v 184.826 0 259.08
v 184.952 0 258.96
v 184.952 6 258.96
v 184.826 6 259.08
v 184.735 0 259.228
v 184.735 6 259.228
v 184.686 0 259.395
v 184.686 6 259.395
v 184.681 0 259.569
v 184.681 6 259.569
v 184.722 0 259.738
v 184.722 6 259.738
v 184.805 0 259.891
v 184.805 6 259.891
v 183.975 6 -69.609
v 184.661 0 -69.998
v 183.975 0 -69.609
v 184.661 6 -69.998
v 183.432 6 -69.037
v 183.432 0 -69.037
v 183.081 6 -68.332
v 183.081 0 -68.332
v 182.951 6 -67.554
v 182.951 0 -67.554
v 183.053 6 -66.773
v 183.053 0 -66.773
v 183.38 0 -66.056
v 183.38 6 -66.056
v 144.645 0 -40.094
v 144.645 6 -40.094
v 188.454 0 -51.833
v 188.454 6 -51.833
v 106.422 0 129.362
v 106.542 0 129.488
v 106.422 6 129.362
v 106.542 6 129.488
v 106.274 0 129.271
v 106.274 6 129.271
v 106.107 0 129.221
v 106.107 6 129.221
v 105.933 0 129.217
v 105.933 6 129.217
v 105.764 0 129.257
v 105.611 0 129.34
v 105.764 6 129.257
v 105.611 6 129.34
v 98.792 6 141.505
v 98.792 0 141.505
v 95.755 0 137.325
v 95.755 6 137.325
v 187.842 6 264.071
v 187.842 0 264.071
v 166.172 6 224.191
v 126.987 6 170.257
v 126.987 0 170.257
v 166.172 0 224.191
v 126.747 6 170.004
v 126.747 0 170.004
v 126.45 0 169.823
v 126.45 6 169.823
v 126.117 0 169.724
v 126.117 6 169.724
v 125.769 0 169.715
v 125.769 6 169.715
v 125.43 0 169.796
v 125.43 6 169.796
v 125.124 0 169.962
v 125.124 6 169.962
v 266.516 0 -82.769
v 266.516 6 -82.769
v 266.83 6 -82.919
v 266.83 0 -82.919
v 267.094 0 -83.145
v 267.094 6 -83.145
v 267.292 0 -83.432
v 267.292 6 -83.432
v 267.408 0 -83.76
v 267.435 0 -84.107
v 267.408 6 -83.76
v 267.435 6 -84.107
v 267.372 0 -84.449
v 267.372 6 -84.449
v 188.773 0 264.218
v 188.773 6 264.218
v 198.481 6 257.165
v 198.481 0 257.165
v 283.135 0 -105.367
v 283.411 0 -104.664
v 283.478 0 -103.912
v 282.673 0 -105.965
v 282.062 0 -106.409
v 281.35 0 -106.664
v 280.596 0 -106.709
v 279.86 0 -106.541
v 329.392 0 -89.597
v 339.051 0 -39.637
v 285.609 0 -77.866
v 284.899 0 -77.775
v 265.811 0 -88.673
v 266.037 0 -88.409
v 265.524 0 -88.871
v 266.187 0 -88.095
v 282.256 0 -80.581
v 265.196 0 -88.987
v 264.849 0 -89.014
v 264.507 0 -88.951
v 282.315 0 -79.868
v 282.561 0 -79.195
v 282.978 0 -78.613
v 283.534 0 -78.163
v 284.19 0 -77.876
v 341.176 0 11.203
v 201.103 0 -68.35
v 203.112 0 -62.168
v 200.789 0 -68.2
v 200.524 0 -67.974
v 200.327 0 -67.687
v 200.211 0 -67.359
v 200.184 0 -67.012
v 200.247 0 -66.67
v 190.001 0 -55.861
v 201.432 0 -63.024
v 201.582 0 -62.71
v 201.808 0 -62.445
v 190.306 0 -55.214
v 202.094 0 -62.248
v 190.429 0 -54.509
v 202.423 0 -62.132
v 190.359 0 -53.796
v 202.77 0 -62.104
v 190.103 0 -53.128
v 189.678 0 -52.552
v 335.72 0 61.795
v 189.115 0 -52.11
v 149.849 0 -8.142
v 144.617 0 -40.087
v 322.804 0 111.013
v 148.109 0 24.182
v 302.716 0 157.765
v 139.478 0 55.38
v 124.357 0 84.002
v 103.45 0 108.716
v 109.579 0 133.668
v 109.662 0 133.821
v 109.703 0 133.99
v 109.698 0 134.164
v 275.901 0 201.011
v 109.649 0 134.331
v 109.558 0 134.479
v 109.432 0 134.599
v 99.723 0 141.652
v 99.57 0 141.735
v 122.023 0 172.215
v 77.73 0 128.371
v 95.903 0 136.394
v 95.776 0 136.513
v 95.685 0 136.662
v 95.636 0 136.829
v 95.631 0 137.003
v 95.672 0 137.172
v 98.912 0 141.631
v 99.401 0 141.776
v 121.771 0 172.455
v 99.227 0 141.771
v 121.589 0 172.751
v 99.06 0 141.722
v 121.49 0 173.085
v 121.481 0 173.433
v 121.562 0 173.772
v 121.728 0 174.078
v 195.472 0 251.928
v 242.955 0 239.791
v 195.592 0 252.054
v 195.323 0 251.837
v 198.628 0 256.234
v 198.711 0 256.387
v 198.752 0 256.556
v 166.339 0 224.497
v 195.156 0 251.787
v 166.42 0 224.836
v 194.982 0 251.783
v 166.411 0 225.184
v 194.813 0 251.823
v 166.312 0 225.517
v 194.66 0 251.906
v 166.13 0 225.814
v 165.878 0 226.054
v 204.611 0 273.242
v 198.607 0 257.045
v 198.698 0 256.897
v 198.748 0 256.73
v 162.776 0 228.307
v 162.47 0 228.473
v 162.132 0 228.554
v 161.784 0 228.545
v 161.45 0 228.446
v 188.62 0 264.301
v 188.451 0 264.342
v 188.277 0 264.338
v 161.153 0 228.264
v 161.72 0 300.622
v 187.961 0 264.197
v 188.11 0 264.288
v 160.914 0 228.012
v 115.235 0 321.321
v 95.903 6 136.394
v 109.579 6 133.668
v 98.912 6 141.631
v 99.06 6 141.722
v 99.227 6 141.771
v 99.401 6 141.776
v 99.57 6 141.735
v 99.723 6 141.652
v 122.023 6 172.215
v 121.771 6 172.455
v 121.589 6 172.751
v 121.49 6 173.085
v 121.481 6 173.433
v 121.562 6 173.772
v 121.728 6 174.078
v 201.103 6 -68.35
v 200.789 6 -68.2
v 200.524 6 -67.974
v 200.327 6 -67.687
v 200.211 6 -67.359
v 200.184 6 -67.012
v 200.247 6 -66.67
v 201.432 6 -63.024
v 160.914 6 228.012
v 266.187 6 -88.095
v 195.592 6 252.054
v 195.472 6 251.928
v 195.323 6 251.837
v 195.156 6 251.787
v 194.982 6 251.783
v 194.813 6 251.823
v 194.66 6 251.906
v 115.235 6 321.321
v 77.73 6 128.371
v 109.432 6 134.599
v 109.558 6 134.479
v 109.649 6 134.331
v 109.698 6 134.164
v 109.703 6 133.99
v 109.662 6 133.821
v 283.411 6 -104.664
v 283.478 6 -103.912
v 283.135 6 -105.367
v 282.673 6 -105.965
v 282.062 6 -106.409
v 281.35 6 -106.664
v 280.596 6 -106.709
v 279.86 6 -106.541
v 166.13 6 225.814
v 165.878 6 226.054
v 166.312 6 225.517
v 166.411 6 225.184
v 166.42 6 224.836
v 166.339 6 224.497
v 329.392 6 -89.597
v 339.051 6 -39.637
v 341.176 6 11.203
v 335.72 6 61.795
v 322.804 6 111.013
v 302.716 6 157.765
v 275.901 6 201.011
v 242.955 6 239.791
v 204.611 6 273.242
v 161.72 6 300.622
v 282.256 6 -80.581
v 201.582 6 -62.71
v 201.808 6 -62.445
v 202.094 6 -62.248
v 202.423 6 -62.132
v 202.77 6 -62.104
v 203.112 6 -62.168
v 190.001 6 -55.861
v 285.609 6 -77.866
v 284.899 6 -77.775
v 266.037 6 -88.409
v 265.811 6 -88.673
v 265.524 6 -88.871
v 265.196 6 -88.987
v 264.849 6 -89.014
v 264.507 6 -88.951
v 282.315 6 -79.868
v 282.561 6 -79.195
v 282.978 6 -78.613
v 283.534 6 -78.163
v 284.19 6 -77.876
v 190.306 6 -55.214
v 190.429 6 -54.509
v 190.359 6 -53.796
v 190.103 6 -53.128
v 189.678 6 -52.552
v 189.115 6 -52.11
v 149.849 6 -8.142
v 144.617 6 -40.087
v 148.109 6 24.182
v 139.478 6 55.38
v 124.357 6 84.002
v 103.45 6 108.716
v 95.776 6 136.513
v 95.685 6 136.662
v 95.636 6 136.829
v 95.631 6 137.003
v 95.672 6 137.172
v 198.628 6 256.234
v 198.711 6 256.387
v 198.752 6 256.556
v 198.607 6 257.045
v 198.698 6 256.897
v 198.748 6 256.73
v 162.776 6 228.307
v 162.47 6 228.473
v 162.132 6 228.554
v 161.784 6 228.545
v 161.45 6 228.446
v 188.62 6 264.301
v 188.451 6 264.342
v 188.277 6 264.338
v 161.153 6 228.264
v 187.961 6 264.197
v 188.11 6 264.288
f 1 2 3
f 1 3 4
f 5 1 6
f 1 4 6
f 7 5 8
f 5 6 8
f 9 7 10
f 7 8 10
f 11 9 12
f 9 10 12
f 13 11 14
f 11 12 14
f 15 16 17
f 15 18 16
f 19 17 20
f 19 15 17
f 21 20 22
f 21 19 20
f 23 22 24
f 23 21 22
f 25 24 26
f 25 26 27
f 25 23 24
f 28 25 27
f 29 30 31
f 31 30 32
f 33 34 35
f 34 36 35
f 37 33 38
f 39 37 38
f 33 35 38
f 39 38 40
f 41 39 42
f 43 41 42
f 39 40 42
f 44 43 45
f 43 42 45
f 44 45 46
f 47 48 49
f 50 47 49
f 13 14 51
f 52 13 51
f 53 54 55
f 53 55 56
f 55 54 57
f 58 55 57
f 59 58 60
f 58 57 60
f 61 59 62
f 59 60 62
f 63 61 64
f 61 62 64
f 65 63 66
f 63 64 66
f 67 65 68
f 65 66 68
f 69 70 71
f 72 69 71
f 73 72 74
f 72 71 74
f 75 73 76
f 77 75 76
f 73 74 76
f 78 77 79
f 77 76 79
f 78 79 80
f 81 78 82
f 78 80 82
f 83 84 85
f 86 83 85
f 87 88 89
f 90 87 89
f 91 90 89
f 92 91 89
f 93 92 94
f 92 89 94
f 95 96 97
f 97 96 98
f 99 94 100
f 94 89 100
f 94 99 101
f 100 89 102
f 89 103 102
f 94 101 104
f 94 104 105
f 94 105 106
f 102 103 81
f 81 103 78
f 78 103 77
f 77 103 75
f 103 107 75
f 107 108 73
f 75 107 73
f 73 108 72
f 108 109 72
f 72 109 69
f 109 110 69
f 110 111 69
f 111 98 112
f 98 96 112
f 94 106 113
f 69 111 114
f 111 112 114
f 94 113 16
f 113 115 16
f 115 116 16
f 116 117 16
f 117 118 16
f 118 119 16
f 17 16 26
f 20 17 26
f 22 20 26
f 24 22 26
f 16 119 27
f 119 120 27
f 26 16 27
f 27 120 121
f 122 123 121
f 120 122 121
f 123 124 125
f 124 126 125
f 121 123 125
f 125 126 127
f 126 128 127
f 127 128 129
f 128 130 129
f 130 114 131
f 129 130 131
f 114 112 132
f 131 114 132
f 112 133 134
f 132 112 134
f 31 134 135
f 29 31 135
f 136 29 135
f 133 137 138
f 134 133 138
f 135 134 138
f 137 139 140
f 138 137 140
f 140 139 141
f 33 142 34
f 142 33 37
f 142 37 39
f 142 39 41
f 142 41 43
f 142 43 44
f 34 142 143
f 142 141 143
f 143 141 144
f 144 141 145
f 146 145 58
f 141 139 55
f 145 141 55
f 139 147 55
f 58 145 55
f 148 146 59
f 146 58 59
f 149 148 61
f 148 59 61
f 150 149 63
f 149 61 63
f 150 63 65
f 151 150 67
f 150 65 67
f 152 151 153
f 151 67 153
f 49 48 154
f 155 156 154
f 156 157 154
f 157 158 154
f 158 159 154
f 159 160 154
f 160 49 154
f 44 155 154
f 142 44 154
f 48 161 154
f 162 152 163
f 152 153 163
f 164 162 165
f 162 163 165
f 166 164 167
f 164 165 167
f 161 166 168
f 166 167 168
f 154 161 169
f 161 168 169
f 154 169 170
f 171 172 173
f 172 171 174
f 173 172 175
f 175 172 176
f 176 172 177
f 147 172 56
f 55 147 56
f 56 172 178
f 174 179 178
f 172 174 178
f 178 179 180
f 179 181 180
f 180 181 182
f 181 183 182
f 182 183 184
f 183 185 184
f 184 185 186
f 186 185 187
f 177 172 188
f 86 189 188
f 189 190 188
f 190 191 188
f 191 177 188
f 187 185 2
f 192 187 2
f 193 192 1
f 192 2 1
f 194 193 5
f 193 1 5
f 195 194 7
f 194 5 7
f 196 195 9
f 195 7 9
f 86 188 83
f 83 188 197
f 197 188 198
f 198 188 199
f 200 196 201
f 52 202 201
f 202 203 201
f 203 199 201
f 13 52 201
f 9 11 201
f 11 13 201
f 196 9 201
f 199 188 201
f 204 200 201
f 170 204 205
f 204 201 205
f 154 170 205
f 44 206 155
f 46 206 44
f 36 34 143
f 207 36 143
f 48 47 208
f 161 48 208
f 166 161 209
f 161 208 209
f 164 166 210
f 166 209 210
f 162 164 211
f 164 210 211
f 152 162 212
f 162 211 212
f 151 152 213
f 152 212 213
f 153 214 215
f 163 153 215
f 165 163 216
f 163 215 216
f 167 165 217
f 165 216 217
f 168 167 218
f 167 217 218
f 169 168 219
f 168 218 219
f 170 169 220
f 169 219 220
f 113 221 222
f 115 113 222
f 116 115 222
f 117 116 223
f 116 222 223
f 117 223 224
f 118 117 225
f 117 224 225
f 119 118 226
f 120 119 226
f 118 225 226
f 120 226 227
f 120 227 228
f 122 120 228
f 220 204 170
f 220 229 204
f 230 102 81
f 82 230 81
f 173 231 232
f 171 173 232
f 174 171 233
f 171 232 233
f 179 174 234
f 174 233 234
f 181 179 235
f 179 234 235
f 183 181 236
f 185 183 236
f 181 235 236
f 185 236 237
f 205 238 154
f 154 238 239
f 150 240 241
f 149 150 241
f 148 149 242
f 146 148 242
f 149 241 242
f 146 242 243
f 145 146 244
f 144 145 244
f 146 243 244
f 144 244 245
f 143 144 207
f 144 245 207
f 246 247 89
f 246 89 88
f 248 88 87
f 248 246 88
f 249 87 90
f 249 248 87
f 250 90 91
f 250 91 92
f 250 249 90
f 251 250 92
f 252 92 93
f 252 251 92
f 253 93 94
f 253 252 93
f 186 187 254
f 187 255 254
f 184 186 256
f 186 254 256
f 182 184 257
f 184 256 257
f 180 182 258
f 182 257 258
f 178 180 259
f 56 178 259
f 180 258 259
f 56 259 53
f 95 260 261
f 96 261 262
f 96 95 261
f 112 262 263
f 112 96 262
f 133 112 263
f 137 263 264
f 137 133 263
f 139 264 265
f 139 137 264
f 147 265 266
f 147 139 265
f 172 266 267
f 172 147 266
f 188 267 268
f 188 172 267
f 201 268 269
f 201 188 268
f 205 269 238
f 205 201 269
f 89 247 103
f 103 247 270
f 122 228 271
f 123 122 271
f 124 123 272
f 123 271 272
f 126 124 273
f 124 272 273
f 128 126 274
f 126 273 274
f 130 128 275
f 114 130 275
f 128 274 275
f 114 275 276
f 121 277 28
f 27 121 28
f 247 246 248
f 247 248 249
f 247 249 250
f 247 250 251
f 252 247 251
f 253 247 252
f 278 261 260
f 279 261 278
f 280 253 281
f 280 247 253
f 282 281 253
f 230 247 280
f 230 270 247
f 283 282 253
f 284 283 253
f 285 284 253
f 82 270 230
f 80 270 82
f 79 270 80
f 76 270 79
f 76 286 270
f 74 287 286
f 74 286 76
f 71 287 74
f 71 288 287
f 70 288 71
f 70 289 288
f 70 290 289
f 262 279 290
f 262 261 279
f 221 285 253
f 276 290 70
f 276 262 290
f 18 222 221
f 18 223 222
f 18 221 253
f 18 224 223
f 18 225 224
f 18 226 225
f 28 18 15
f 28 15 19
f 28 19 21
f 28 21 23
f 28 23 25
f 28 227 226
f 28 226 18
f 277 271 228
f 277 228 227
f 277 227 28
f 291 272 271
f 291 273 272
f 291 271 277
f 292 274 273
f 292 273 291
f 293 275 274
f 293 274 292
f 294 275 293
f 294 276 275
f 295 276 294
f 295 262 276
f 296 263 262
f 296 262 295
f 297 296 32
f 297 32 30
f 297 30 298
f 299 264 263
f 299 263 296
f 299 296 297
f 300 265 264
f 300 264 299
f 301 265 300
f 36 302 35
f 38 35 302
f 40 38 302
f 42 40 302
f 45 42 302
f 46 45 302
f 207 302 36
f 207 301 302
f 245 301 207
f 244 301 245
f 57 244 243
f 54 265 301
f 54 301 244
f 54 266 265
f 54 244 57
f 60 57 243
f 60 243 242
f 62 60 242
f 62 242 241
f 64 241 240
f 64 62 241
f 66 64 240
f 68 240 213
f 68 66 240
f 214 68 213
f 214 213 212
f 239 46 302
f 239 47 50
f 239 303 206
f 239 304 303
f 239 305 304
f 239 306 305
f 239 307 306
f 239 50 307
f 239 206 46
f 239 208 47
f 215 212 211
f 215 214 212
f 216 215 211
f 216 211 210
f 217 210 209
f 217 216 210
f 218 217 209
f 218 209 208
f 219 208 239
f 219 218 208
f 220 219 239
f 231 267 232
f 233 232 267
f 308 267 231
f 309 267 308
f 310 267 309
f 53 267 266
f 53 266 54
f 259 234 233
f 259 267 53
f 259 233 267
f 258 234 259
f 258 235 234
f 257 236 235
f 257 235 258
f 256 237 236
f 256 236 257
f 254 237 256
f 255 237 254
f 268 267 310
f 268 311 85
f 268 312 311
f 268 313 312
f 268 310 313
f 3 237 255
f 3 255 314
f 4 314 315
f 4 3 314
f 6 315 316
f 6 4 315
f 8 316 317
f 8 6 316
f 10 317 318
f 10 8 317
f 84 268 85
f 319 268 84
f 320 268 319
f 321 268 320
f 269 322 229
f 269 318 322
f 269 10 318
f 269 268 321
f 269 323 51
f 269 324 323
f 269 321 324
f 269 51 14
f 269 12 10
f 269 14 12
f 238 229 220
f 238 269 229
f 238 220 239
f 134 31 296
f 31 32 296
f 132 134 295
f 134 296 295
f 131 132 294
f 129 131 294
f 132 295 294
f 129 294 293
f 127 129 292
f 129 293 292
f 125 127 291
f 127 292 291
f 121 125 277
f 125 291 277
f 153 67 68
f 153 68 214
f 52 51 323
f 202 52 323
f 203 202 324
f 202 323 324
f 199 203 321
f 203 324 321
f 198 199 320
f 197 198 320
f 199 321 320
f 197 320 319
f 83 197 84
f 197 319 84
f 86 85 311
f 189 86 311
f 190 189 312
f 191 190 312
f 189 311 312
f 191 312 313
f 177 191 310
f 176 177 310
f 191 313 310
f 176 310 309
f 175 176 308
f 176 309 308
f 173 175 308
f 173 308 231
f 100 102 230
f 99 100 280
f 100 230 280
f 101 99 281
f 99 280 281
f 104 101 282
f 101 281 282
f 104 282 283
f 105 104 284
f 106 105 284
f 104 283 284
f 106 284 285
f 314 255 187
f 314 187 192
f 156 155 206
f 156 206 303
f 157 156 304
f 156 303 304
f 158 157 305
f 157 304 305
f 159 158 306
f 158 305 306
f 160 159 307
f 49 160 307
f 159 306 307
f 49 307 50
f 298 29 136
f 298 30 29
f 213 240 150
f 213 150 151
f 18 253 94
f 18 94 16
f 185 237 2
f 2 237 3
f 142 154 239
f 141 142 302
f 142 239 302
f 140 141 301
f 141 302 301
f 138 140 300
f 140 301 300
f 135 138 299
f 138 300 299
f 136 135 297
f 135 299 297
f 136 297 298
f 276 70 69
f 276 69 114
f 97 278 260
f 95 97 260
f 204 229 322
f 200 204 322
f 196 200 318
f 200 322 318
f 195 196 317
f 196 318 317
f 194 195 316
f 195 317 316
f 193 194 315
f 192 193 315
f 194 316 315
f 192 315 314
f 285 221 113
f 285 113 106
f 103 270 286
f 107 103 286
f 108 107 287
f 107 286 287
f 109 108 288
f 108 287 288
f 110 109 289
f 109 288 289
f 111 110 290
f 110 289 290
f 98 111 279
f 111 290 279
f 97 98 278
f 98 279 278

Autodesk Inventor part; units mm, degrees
ref_plane "YZ Plane" through (0, 0, 0) normal (1, 0, 0) x (0, 1, 0)
ref_plane "XZ Plane" through (0, 0, 0) normal (0, 1, 0) x (-1, 0, 0)
ref_plane "XY Plane" through (0, 0, 0) normal (0, 0, 1) x (1, 0, 0)
sketch "Sketch1" plane through (0, 0, 0) normal (0, 1, 0) x (-1, 0, 0)
  circle A0 centre (0, 0) radius 341.36
  circle A1 centre (0, 0) radius 150.07
  dimension "d84" = 300.14
  dimension "d85" = 682.72
extrude "Extrusion3" add sketch "Sketch1" along normal blind 6 contours A0 | A1
sketch "Sketch2" plane through (0, 6, 0) normal (0, 1, 0) x (1, 0, 0)
  circle A0 centre (0, 0) radius 245.715 construction
  line L0 (245.7148, 0.3131) -> (341.6521, -0.0088)
  line L1 (3.25, 279.0483) -> (3.25, 212.3817)
  line L2 (-3.25, 212.3817) -> (-3.25, 279.0483)
  arc A1 (-3.25, 212.3817) -> (-1.9167, 211.0483) centre (-1.9167, 212.3817) ccw
  arc A2 (1.9167, 211.0483) -> (3.25, 212.3817) centre (1.9167, 212.3817) ccw
  arc A3 (-1.9167, 280.3817) -> (-3.25, 279.0483) centre (-1.9167, 279.0483) ccw
  arc A4 (3.25, 279.0483) -> (1.9167, 280.3817) centre (1.9167, 279.0483) ccw
  line L3 (-1.9167, 280.3817) -> (1.9167, 280.3817)
  line L4 (-1.9167, 211.0483) -> (1.9167, 211.0483)
  line L5 (0, 0) -> (0, 212.3817)
  line L6 (0, 280.3817) -> (0, 341.36)
  line L7 (0, 211.0483) -> (0, 245.715) construction
  line L8 (0, 280.3817) -> (0, 245.715) construction
  line L9 (-266.6835, 86.5666) -> (-233.7136, 75.854) construction
  line L10 (-264.4112, 89.2455) -> (-201.0074, 68.6444)
  arc A5 (-200.1513, 66.9643) -> (-201.0074, 68.6444) centre (-201.4194, 67.3763) ccw
  line L11 (-200.7436, 65.1414) -> (-233.7136, 75.854) construction
  line L12 (-201.3359, 63.3186) -> (-200.1513, 66.9643)
  line L13 (-267.2758, 84.7438) -> (-266.0912, 88.3895)
  line L14 (-203.016, 62.4625) -> (-266.4198, 83.0637)
  arc A6 (-203.016, 62.4625) -> (-201.3359, 63.3186) centre (-202.604, 63.7306) ccw
  arc A7 (-267.2758, 84.7438) -> (-266.4198, 83.0637) centre (-266.0077, 84.3317) ccw
  arc A8 (-264.4112, 89.2455) -> (-266.0912, 88.3895) centre (-264.8232, 87.9775) ccw
  line L15 (-165.0631, -226.6454) -> (-144.6865, -198.5995) construction
  line L16 (-166.9087, -223.6565) -> (-127.723, -169.722)
  arc A9 (-125.8606, -169.427) -> (-127.723, -169.722) centre (-126.6443, -170.5057) ccw
  line L17 (-124.31, -170.5536) -> (-144.6865, -198.5995) construction
  line L18 (-122.7594, -171.6802) -> (-125.8606, -169.427)
  line L19 (-163.5125, -227.772) -> (-166.6137, -225.5189)
  line L20 (-122.4644, -173.5426) -> (-161.6501, -227.4771)
  arc A10 (-122.4644, -173.5426) -> (-122.7594, -171.6802) centre (-123.5431, -172.7589) ccw
  arc A11 (-163.5125, -227.772) -> (-161.6501, -227.4771) centre (-162.7288, -226.6933) ccw
  arc A12 (-166.9087, -223.6565) -> (-166.6137, -225.5189) centre (-165.83, -224.4402) ccw
  line L21 (164.8042, -226.8335) -> (144.4277, -198.7876) construction
  line L22 (160.9139, -228.0119) -> (121.7282, -174.0775)
  arc A13 (122.0232, -172.2151) -> (121.7282, -174.0775) centre (122.8069, -173.2938) ccw
  line L23 (123.5738, -171.0885) -> (144.4277, -198.7876) construction
  line L24 (125.1244, -169.9619) -> (122.0232, -172.2151)
  line L25 (165.8775, -226.0537) -> (162.7763, -228.3069)
  line L26 (126.9868, -170.2569) -> (166.1725, -224.1913)
  arc A14 (126.9868, -170.2569) -> (125.1244, -169.9619) centre (125.9081, -171.0406) ccw
  arc A15 (165.8775, -226.0537) -> (166.1725, -224.1913) centre (165.0938, -224.975) ccw
  arc A16 (160.9139, -228.0119) -> (162.7763, -228.3069) centre (161.9926, -227.2282) ccw
  line L27 (266.7793, 86.2718) -> (233.8094, 75.5592) construction
  line L28 (266.5156, 82.7688) -> (203.1118, 62.1677)
  arc A17 (201.4317, 63.0238) -> (203.1118, 62.1677) centre (202.6998, 63.4358) ccw
  line L29 (200.8394, 64.8466) -> (233.8094, 75.5592) construction
  line L30 (200.2471, 66.6695) -> (201.4317, 63.0238)
  line L31 (266.187, 88.0946) -> (267.3716, 84.4489)
  line L32 (201.1032, 68.3496) -> (264.5069, 88.9507)
  arc A18 (201.1032, 68.3496) -> (200.2471, 66.6695) centre (201.5152, 67.0815) ccw
  arc A19 (266.187, 88.0946) -> (264.5069, 88.9507) centre (264.919, 87.6826) ccw
  arc A20 (266.5156, 82.7688) -> (267.3716, 84.4489) centre (266.1035, 84.0369) ccw
  point P0 (-202.0117, 65.5535)
  point P1 (-125.0937, -171.6323)
  point P2 (124.8348, -171.8204)
  point P3 (202.1075, 65.2586)
  dimension "d21" = 6.5
  dimension "d24" = 2.6667
  dimension "d25" = 2.6667
  dimension "d32" = 1.3333
  dimension "d33" = 1.3333
  dimension "d41" = 90
  dimension "d42" = 3.25
  dimension "d43" = 90
  dimension "d86" = 491.43
extrude "Extrusion4" cut sketch "Sketch2" against normal through all
sketch "Sketch3" plane through (0, 6, 0) normal (0, 1, 0) x (1, 0, 0)
  arc A0 (-115.2299, -321.3234) -> (115.2355, -321.3214) centre (0, 0) ccw
  arc A1 (-77.7244, -128.3741) -> (77.7297, -128.3709) centre (0, 0) ccw
  line L0 (-122.1811, -173.696) -> (-161.3589, -227.6196)
  line L1 (-115.2299, -321.3234) -> (-77.7244, -128.3741)
  line L2 (0, 0) -> (0, -341.2918)
  line L3 (115.2355, -321.3214) -> (77.7297, -128.3709)
  line L4 (161.3912, -227.6651) -> (122.2055, -173.7307) projected
  dimension "d52" = 25
  dimension "d87" = 150.07
  dimension "d88" = 341.36
  dimension "d89" = 25
  dimension "d90" = 11
  dimension "d91" = 11
extrude "Extrusion5" cut sketch "Sketch3" against normal blind 10
sketch "Sketch5" plane through (0, 6, 0) normal (0, 1, 0) x (1, 0, 0)
  line L0 (3.25, 279.0483) -> (3.25, 212.3817) projected
  line L1 (5.5862, 197.9634) -> (-6.155, 194.8174)
  line L2 (-11.2263, 301.7146) -> (10.5847, 293.3421)
  line L3 (6.5657, 149.9554) -> (8.9394, 195.248)
  line L4 (14.2034, 295.6921) -> (16.5771, 340.9846)
  arc A0 (10.5847, 293.3421) -> (14.2034, 295.6921) centre (11.5404, 295.8316) ccw
  arc A1 (8.9394, 195.248) -> (5.5862, 197.9634) centre (6.2763, 195.3876) ccw
  arc A2 (-11.2263, 301.7146) -> (-14.8449, 299.0854) centre (-12.1819, 299.225) ccw
  line L5 (-3.25, 212.3817) -> (-3.25, 279.0483) projected
  line L6 (-14.8449, 299.0854) -> (-9.5081, 197.2536)
  arc A3 (-9.5081, 197.2536) -> (-6.155, 194.8174) centre (-6.8451, 197.3932) ccw
  line L7 (-1.9167, 211.0483) -> (1.9167, 211.0483) projected
  line L8 (1.9167, 280.3817) -> (-1.9167, 280.3817) projected
  arc A4 (115.2355, -321.3214) -> (-115.2299, -321.3234) centre (0, 0) ccw
  line L9 (16.5771, 340.9846) -> (16.5774, 340.9903)
  arc A5 (-190.5375, 51.9119) -> (-187.1843, 54.3482) centre (-189.8473, 54.4877) ccw
  line L10 (-186.5481, 66.4868) -> (-187.1843, 54.3482)
  arc A6 (-182.9295, 68.8368) -> (-186.5481, 66.4868) centre (-183.8851, 66.3472) ccw
  arc A7 (-275.714, 100.7144) -> (-276.8308, 104.8821) centre (-277.7864, 102.3926) ccw
  line L11 (-289.0345, 78.3041) -> (-190.5375, 51.9119)
  arc A8 (-290.4167, 82.5581) -> (-289.0345, 78.3041) centre (-288.3443, 80.8799) ccw
  line L12 (-290.4167, 82.5581) -> (-275.714, 100.7144)
  line L13 (-276.8308, 104.8821) -> (-319.1731, 121.1358)
  line L14 (-140.5872, 52.5831) -> (-182.9295, 68.8368)
  line L15 (-319.1731, 121.1358) -> (-319.1784, 121.1378)
  arc A9 (184.6611, 69.9975) -> (183.3803, 66.0556) centre (185.6168, 67.508) ccw
  line L16 (190.0006, 55.8613) -> (183.3803, 66.0556)
  arc A10 (188.4543, 51.8331) -> (190.0006, 55.8613) centre (187.7641, 54.4089) ccw
  arc A11 (282.2558, 80.581) -> (285.609, 77.8656) centre (284.9188, 80.4414) ccw
  line L17 (279.8598, 106.5409) -> (184.6611, 69.9975)
  arc A12 (283.4785, 103.9117) -> (279.8598, 106.5409) centre (280.8155, 104.0513) ccw
  line L18 (283.4785, 103.9117) -> (282.2558, 80.581)
  line L19 (285.609, 77.8656) -> (329.4183, 89.6043)
  line L20 (144.645, 40.0945) -> (188.4543, 51.8331)
  line L21 (329.4183, 89.6043) -> (329.4238, 89.6058)
  circle A13 centre (0, 0) radius 150.07
  line L22 (-140.5872, 52.5831) -> (-140.5479, 52.568)
  line L23 (144.645, 40.0945) -> (144.5122, 40.0589)
  line L24 (6.5657, 149.9554) -> (6.5621, 149.8874)
  arc A14 (-77.7244, -128.3741) -> (77.7297, -128.3709) centre (0, 0) ccw projected
  arc A15 (115.2355, -321.3214) -> (-115.2299, -321.3234) centre (0, 0) ccw projected
  line L25 (77.7297, -128.3709) -> (115.2355, -321.3214)
  line L26 (-77.7244, -128.3741) -> (-115.2299, -321.3234)
  point P0 (-77.7399, -128.3998)
  point P1 (77.7399, -128.3998)
  point P2 (-319.1475, 121.126)
  point P3 (-140.56, 52.5727)
  point P4 (6.5642, 149.9264)
  point P5 (16.5757, 340.9573)
  point P6 (329.3918, 89.5972)
  point P7 (144.6169, 40.0869)
  dimension "d63" = 2.6667
  dimension "d64" = 3
  dimension "d66" = 3
  dimension "d67" = 2.6667
  dimension "d68" = 2.6667
  dimension "d70" = 72
  dimension "d71" = 72
  dimension "d94" = 300.14
  dimension "d95" = 682.72
sketch "Sketch6" plane through (0, 6, 0) normal (0, 1, 0) x (1, 0, 0)
  line L0 (188.7727, -264.2184) -> (198.4809, -257.165)
  line L1 (194.6603, -251.9064) -> (184.9521, -258.9598)
  line L2 (161.3912, -227.6651) -> (122.2055, -173.7307) projected
  line L3 (166.3548, -225.7069) -> (163.2536, -227.9601) projected
  arc A0 (195.5915, -252.0539) -> (194.6603, -251.9064) centre (195.0522, -252.4457) ccw
  arc A1 (198.4809, -257.165) -> (198.6284, -256.2338) centre (198.0891, -256.6256) ccw
  arc A2 (187.8415, -264.0709) -> (188.7727, -264.2184) centre (188.3809, -263.6791) ccw
  arc A3 (184.9521, -258.9598) -> (184.8046, -259.891) centre (185.344, -259.4991) ccw
  line L4 (184.8046, -259.891) -> (187.8415, -264.0709)
  line L5 (198.6284, -256.2338) -> (195.5915, -252.0539)
  line L6 (122.2055, -173.7307) -> (161.3912, -227.6651) projected
  line L7 (141.7983, -200.6979) -> (147.057, -196.8773)
  line L8 (166.6498, -223.8445) -> (127.4641, -169.9101) projected
  line L9 (95.9027, -136.3937) -> (105.6109, -129.3403)
  line L10 (109.4315, -134.5989) -> (99.7233, -141.6523)
  arc A4 (109.4315, -134.5989) -> (109.579, -133.6677) centre (109.0396, -134.0596) ccw
  arc A5 (106.5421, -129.4878) -> (105.6109, -129.3403) centre (106.0027, -129.8796) ccw
  arc A6 (95.9027, -136.3937) -> (95.7552, -137.3249) centre (96.2945, -136.9331) ccw
  arc A7 (98.7921, -141.5048) -> (99.7233, -141.6523) centre (99.3314, -141.113) ccw
  line L11 (98.7921, -141.5048) -> (95.7552, -137.3249)
  line L12 (106.5421, -129.4878) -> (109.579, -133.6677)
  point P0 (0, 0)
  dimension "d104" = 6.5
  dimension "d105" = 12
  dimension "d108" = 1.3333
  dimension "d109" = 1.3333
  dimension "d110" = 1.3333
  dimension "d111" = 1.3333
  dimension "d112" = 0
  dimension "d149" = 145
  dimension "d150" = 90
  dimension "d151" = 90
  dimension "d152" = 90
  dimension "d153" = 90
extrude "Extrusion7" cut sketch "Sketch6" against normal through all
pattern_circular "Circular Pattern2" count 2 over 72 about axis through (0, -10, 0) along (0, 1, 0) of "Extrusion7"
pattern_circular "Circular Pattern3" count 2 over 144 about axis through (0, -10, 0) along (0, 1, 0) of "Extrusion7"
mirror "Mirror3" about plane through (0, 0, 0) normal (1, 0, 0) of "Extrusion7"
pattern_circular "Circular Pattern4" count 2 over 144 about axis through (0, -10, 0) along (0, -1, 0) of "Extrusion7"
extrude "Extrusion10" cut sketch "Sketch5" against normal through all contours A1 L3 L24 A13 L22 L14 A6 L10 A5 L11 A8 L12 A7 L13 A4 L4 A0 L2 A2 L6 A3 L1 | L1 A3 L6 A2 L2 A0 L4 A4 L19 A11 L18 A12 L17 A9 L16 A10 L20 L23 A13 L24 L3 A1 | A13 | A13 L26 A4 L13 A7 L12 A8 L11 A5 L10 A6 L14 L22
equation "\"BendRadius\" = Thickness"
equation "\"BendReliefWidth\" = Thickness"
equation "\"BendReliefDepth\" = 0.5 * Thickness"
equation "\"CornerReliefSize\" = 4 * Thickness"
equation "\"MinimumRemnant\" = 2 * Thickness"
equation "\"TransitionRadius\" = BendRadius"
equation "\"JacobiRadiusSize\" = BendRadius"
equation "\"GapSize\" = Thickness"
equation "\"Thickness\" = 0.5"
properties part number "Ring D4" material "Wood (Maple)"
